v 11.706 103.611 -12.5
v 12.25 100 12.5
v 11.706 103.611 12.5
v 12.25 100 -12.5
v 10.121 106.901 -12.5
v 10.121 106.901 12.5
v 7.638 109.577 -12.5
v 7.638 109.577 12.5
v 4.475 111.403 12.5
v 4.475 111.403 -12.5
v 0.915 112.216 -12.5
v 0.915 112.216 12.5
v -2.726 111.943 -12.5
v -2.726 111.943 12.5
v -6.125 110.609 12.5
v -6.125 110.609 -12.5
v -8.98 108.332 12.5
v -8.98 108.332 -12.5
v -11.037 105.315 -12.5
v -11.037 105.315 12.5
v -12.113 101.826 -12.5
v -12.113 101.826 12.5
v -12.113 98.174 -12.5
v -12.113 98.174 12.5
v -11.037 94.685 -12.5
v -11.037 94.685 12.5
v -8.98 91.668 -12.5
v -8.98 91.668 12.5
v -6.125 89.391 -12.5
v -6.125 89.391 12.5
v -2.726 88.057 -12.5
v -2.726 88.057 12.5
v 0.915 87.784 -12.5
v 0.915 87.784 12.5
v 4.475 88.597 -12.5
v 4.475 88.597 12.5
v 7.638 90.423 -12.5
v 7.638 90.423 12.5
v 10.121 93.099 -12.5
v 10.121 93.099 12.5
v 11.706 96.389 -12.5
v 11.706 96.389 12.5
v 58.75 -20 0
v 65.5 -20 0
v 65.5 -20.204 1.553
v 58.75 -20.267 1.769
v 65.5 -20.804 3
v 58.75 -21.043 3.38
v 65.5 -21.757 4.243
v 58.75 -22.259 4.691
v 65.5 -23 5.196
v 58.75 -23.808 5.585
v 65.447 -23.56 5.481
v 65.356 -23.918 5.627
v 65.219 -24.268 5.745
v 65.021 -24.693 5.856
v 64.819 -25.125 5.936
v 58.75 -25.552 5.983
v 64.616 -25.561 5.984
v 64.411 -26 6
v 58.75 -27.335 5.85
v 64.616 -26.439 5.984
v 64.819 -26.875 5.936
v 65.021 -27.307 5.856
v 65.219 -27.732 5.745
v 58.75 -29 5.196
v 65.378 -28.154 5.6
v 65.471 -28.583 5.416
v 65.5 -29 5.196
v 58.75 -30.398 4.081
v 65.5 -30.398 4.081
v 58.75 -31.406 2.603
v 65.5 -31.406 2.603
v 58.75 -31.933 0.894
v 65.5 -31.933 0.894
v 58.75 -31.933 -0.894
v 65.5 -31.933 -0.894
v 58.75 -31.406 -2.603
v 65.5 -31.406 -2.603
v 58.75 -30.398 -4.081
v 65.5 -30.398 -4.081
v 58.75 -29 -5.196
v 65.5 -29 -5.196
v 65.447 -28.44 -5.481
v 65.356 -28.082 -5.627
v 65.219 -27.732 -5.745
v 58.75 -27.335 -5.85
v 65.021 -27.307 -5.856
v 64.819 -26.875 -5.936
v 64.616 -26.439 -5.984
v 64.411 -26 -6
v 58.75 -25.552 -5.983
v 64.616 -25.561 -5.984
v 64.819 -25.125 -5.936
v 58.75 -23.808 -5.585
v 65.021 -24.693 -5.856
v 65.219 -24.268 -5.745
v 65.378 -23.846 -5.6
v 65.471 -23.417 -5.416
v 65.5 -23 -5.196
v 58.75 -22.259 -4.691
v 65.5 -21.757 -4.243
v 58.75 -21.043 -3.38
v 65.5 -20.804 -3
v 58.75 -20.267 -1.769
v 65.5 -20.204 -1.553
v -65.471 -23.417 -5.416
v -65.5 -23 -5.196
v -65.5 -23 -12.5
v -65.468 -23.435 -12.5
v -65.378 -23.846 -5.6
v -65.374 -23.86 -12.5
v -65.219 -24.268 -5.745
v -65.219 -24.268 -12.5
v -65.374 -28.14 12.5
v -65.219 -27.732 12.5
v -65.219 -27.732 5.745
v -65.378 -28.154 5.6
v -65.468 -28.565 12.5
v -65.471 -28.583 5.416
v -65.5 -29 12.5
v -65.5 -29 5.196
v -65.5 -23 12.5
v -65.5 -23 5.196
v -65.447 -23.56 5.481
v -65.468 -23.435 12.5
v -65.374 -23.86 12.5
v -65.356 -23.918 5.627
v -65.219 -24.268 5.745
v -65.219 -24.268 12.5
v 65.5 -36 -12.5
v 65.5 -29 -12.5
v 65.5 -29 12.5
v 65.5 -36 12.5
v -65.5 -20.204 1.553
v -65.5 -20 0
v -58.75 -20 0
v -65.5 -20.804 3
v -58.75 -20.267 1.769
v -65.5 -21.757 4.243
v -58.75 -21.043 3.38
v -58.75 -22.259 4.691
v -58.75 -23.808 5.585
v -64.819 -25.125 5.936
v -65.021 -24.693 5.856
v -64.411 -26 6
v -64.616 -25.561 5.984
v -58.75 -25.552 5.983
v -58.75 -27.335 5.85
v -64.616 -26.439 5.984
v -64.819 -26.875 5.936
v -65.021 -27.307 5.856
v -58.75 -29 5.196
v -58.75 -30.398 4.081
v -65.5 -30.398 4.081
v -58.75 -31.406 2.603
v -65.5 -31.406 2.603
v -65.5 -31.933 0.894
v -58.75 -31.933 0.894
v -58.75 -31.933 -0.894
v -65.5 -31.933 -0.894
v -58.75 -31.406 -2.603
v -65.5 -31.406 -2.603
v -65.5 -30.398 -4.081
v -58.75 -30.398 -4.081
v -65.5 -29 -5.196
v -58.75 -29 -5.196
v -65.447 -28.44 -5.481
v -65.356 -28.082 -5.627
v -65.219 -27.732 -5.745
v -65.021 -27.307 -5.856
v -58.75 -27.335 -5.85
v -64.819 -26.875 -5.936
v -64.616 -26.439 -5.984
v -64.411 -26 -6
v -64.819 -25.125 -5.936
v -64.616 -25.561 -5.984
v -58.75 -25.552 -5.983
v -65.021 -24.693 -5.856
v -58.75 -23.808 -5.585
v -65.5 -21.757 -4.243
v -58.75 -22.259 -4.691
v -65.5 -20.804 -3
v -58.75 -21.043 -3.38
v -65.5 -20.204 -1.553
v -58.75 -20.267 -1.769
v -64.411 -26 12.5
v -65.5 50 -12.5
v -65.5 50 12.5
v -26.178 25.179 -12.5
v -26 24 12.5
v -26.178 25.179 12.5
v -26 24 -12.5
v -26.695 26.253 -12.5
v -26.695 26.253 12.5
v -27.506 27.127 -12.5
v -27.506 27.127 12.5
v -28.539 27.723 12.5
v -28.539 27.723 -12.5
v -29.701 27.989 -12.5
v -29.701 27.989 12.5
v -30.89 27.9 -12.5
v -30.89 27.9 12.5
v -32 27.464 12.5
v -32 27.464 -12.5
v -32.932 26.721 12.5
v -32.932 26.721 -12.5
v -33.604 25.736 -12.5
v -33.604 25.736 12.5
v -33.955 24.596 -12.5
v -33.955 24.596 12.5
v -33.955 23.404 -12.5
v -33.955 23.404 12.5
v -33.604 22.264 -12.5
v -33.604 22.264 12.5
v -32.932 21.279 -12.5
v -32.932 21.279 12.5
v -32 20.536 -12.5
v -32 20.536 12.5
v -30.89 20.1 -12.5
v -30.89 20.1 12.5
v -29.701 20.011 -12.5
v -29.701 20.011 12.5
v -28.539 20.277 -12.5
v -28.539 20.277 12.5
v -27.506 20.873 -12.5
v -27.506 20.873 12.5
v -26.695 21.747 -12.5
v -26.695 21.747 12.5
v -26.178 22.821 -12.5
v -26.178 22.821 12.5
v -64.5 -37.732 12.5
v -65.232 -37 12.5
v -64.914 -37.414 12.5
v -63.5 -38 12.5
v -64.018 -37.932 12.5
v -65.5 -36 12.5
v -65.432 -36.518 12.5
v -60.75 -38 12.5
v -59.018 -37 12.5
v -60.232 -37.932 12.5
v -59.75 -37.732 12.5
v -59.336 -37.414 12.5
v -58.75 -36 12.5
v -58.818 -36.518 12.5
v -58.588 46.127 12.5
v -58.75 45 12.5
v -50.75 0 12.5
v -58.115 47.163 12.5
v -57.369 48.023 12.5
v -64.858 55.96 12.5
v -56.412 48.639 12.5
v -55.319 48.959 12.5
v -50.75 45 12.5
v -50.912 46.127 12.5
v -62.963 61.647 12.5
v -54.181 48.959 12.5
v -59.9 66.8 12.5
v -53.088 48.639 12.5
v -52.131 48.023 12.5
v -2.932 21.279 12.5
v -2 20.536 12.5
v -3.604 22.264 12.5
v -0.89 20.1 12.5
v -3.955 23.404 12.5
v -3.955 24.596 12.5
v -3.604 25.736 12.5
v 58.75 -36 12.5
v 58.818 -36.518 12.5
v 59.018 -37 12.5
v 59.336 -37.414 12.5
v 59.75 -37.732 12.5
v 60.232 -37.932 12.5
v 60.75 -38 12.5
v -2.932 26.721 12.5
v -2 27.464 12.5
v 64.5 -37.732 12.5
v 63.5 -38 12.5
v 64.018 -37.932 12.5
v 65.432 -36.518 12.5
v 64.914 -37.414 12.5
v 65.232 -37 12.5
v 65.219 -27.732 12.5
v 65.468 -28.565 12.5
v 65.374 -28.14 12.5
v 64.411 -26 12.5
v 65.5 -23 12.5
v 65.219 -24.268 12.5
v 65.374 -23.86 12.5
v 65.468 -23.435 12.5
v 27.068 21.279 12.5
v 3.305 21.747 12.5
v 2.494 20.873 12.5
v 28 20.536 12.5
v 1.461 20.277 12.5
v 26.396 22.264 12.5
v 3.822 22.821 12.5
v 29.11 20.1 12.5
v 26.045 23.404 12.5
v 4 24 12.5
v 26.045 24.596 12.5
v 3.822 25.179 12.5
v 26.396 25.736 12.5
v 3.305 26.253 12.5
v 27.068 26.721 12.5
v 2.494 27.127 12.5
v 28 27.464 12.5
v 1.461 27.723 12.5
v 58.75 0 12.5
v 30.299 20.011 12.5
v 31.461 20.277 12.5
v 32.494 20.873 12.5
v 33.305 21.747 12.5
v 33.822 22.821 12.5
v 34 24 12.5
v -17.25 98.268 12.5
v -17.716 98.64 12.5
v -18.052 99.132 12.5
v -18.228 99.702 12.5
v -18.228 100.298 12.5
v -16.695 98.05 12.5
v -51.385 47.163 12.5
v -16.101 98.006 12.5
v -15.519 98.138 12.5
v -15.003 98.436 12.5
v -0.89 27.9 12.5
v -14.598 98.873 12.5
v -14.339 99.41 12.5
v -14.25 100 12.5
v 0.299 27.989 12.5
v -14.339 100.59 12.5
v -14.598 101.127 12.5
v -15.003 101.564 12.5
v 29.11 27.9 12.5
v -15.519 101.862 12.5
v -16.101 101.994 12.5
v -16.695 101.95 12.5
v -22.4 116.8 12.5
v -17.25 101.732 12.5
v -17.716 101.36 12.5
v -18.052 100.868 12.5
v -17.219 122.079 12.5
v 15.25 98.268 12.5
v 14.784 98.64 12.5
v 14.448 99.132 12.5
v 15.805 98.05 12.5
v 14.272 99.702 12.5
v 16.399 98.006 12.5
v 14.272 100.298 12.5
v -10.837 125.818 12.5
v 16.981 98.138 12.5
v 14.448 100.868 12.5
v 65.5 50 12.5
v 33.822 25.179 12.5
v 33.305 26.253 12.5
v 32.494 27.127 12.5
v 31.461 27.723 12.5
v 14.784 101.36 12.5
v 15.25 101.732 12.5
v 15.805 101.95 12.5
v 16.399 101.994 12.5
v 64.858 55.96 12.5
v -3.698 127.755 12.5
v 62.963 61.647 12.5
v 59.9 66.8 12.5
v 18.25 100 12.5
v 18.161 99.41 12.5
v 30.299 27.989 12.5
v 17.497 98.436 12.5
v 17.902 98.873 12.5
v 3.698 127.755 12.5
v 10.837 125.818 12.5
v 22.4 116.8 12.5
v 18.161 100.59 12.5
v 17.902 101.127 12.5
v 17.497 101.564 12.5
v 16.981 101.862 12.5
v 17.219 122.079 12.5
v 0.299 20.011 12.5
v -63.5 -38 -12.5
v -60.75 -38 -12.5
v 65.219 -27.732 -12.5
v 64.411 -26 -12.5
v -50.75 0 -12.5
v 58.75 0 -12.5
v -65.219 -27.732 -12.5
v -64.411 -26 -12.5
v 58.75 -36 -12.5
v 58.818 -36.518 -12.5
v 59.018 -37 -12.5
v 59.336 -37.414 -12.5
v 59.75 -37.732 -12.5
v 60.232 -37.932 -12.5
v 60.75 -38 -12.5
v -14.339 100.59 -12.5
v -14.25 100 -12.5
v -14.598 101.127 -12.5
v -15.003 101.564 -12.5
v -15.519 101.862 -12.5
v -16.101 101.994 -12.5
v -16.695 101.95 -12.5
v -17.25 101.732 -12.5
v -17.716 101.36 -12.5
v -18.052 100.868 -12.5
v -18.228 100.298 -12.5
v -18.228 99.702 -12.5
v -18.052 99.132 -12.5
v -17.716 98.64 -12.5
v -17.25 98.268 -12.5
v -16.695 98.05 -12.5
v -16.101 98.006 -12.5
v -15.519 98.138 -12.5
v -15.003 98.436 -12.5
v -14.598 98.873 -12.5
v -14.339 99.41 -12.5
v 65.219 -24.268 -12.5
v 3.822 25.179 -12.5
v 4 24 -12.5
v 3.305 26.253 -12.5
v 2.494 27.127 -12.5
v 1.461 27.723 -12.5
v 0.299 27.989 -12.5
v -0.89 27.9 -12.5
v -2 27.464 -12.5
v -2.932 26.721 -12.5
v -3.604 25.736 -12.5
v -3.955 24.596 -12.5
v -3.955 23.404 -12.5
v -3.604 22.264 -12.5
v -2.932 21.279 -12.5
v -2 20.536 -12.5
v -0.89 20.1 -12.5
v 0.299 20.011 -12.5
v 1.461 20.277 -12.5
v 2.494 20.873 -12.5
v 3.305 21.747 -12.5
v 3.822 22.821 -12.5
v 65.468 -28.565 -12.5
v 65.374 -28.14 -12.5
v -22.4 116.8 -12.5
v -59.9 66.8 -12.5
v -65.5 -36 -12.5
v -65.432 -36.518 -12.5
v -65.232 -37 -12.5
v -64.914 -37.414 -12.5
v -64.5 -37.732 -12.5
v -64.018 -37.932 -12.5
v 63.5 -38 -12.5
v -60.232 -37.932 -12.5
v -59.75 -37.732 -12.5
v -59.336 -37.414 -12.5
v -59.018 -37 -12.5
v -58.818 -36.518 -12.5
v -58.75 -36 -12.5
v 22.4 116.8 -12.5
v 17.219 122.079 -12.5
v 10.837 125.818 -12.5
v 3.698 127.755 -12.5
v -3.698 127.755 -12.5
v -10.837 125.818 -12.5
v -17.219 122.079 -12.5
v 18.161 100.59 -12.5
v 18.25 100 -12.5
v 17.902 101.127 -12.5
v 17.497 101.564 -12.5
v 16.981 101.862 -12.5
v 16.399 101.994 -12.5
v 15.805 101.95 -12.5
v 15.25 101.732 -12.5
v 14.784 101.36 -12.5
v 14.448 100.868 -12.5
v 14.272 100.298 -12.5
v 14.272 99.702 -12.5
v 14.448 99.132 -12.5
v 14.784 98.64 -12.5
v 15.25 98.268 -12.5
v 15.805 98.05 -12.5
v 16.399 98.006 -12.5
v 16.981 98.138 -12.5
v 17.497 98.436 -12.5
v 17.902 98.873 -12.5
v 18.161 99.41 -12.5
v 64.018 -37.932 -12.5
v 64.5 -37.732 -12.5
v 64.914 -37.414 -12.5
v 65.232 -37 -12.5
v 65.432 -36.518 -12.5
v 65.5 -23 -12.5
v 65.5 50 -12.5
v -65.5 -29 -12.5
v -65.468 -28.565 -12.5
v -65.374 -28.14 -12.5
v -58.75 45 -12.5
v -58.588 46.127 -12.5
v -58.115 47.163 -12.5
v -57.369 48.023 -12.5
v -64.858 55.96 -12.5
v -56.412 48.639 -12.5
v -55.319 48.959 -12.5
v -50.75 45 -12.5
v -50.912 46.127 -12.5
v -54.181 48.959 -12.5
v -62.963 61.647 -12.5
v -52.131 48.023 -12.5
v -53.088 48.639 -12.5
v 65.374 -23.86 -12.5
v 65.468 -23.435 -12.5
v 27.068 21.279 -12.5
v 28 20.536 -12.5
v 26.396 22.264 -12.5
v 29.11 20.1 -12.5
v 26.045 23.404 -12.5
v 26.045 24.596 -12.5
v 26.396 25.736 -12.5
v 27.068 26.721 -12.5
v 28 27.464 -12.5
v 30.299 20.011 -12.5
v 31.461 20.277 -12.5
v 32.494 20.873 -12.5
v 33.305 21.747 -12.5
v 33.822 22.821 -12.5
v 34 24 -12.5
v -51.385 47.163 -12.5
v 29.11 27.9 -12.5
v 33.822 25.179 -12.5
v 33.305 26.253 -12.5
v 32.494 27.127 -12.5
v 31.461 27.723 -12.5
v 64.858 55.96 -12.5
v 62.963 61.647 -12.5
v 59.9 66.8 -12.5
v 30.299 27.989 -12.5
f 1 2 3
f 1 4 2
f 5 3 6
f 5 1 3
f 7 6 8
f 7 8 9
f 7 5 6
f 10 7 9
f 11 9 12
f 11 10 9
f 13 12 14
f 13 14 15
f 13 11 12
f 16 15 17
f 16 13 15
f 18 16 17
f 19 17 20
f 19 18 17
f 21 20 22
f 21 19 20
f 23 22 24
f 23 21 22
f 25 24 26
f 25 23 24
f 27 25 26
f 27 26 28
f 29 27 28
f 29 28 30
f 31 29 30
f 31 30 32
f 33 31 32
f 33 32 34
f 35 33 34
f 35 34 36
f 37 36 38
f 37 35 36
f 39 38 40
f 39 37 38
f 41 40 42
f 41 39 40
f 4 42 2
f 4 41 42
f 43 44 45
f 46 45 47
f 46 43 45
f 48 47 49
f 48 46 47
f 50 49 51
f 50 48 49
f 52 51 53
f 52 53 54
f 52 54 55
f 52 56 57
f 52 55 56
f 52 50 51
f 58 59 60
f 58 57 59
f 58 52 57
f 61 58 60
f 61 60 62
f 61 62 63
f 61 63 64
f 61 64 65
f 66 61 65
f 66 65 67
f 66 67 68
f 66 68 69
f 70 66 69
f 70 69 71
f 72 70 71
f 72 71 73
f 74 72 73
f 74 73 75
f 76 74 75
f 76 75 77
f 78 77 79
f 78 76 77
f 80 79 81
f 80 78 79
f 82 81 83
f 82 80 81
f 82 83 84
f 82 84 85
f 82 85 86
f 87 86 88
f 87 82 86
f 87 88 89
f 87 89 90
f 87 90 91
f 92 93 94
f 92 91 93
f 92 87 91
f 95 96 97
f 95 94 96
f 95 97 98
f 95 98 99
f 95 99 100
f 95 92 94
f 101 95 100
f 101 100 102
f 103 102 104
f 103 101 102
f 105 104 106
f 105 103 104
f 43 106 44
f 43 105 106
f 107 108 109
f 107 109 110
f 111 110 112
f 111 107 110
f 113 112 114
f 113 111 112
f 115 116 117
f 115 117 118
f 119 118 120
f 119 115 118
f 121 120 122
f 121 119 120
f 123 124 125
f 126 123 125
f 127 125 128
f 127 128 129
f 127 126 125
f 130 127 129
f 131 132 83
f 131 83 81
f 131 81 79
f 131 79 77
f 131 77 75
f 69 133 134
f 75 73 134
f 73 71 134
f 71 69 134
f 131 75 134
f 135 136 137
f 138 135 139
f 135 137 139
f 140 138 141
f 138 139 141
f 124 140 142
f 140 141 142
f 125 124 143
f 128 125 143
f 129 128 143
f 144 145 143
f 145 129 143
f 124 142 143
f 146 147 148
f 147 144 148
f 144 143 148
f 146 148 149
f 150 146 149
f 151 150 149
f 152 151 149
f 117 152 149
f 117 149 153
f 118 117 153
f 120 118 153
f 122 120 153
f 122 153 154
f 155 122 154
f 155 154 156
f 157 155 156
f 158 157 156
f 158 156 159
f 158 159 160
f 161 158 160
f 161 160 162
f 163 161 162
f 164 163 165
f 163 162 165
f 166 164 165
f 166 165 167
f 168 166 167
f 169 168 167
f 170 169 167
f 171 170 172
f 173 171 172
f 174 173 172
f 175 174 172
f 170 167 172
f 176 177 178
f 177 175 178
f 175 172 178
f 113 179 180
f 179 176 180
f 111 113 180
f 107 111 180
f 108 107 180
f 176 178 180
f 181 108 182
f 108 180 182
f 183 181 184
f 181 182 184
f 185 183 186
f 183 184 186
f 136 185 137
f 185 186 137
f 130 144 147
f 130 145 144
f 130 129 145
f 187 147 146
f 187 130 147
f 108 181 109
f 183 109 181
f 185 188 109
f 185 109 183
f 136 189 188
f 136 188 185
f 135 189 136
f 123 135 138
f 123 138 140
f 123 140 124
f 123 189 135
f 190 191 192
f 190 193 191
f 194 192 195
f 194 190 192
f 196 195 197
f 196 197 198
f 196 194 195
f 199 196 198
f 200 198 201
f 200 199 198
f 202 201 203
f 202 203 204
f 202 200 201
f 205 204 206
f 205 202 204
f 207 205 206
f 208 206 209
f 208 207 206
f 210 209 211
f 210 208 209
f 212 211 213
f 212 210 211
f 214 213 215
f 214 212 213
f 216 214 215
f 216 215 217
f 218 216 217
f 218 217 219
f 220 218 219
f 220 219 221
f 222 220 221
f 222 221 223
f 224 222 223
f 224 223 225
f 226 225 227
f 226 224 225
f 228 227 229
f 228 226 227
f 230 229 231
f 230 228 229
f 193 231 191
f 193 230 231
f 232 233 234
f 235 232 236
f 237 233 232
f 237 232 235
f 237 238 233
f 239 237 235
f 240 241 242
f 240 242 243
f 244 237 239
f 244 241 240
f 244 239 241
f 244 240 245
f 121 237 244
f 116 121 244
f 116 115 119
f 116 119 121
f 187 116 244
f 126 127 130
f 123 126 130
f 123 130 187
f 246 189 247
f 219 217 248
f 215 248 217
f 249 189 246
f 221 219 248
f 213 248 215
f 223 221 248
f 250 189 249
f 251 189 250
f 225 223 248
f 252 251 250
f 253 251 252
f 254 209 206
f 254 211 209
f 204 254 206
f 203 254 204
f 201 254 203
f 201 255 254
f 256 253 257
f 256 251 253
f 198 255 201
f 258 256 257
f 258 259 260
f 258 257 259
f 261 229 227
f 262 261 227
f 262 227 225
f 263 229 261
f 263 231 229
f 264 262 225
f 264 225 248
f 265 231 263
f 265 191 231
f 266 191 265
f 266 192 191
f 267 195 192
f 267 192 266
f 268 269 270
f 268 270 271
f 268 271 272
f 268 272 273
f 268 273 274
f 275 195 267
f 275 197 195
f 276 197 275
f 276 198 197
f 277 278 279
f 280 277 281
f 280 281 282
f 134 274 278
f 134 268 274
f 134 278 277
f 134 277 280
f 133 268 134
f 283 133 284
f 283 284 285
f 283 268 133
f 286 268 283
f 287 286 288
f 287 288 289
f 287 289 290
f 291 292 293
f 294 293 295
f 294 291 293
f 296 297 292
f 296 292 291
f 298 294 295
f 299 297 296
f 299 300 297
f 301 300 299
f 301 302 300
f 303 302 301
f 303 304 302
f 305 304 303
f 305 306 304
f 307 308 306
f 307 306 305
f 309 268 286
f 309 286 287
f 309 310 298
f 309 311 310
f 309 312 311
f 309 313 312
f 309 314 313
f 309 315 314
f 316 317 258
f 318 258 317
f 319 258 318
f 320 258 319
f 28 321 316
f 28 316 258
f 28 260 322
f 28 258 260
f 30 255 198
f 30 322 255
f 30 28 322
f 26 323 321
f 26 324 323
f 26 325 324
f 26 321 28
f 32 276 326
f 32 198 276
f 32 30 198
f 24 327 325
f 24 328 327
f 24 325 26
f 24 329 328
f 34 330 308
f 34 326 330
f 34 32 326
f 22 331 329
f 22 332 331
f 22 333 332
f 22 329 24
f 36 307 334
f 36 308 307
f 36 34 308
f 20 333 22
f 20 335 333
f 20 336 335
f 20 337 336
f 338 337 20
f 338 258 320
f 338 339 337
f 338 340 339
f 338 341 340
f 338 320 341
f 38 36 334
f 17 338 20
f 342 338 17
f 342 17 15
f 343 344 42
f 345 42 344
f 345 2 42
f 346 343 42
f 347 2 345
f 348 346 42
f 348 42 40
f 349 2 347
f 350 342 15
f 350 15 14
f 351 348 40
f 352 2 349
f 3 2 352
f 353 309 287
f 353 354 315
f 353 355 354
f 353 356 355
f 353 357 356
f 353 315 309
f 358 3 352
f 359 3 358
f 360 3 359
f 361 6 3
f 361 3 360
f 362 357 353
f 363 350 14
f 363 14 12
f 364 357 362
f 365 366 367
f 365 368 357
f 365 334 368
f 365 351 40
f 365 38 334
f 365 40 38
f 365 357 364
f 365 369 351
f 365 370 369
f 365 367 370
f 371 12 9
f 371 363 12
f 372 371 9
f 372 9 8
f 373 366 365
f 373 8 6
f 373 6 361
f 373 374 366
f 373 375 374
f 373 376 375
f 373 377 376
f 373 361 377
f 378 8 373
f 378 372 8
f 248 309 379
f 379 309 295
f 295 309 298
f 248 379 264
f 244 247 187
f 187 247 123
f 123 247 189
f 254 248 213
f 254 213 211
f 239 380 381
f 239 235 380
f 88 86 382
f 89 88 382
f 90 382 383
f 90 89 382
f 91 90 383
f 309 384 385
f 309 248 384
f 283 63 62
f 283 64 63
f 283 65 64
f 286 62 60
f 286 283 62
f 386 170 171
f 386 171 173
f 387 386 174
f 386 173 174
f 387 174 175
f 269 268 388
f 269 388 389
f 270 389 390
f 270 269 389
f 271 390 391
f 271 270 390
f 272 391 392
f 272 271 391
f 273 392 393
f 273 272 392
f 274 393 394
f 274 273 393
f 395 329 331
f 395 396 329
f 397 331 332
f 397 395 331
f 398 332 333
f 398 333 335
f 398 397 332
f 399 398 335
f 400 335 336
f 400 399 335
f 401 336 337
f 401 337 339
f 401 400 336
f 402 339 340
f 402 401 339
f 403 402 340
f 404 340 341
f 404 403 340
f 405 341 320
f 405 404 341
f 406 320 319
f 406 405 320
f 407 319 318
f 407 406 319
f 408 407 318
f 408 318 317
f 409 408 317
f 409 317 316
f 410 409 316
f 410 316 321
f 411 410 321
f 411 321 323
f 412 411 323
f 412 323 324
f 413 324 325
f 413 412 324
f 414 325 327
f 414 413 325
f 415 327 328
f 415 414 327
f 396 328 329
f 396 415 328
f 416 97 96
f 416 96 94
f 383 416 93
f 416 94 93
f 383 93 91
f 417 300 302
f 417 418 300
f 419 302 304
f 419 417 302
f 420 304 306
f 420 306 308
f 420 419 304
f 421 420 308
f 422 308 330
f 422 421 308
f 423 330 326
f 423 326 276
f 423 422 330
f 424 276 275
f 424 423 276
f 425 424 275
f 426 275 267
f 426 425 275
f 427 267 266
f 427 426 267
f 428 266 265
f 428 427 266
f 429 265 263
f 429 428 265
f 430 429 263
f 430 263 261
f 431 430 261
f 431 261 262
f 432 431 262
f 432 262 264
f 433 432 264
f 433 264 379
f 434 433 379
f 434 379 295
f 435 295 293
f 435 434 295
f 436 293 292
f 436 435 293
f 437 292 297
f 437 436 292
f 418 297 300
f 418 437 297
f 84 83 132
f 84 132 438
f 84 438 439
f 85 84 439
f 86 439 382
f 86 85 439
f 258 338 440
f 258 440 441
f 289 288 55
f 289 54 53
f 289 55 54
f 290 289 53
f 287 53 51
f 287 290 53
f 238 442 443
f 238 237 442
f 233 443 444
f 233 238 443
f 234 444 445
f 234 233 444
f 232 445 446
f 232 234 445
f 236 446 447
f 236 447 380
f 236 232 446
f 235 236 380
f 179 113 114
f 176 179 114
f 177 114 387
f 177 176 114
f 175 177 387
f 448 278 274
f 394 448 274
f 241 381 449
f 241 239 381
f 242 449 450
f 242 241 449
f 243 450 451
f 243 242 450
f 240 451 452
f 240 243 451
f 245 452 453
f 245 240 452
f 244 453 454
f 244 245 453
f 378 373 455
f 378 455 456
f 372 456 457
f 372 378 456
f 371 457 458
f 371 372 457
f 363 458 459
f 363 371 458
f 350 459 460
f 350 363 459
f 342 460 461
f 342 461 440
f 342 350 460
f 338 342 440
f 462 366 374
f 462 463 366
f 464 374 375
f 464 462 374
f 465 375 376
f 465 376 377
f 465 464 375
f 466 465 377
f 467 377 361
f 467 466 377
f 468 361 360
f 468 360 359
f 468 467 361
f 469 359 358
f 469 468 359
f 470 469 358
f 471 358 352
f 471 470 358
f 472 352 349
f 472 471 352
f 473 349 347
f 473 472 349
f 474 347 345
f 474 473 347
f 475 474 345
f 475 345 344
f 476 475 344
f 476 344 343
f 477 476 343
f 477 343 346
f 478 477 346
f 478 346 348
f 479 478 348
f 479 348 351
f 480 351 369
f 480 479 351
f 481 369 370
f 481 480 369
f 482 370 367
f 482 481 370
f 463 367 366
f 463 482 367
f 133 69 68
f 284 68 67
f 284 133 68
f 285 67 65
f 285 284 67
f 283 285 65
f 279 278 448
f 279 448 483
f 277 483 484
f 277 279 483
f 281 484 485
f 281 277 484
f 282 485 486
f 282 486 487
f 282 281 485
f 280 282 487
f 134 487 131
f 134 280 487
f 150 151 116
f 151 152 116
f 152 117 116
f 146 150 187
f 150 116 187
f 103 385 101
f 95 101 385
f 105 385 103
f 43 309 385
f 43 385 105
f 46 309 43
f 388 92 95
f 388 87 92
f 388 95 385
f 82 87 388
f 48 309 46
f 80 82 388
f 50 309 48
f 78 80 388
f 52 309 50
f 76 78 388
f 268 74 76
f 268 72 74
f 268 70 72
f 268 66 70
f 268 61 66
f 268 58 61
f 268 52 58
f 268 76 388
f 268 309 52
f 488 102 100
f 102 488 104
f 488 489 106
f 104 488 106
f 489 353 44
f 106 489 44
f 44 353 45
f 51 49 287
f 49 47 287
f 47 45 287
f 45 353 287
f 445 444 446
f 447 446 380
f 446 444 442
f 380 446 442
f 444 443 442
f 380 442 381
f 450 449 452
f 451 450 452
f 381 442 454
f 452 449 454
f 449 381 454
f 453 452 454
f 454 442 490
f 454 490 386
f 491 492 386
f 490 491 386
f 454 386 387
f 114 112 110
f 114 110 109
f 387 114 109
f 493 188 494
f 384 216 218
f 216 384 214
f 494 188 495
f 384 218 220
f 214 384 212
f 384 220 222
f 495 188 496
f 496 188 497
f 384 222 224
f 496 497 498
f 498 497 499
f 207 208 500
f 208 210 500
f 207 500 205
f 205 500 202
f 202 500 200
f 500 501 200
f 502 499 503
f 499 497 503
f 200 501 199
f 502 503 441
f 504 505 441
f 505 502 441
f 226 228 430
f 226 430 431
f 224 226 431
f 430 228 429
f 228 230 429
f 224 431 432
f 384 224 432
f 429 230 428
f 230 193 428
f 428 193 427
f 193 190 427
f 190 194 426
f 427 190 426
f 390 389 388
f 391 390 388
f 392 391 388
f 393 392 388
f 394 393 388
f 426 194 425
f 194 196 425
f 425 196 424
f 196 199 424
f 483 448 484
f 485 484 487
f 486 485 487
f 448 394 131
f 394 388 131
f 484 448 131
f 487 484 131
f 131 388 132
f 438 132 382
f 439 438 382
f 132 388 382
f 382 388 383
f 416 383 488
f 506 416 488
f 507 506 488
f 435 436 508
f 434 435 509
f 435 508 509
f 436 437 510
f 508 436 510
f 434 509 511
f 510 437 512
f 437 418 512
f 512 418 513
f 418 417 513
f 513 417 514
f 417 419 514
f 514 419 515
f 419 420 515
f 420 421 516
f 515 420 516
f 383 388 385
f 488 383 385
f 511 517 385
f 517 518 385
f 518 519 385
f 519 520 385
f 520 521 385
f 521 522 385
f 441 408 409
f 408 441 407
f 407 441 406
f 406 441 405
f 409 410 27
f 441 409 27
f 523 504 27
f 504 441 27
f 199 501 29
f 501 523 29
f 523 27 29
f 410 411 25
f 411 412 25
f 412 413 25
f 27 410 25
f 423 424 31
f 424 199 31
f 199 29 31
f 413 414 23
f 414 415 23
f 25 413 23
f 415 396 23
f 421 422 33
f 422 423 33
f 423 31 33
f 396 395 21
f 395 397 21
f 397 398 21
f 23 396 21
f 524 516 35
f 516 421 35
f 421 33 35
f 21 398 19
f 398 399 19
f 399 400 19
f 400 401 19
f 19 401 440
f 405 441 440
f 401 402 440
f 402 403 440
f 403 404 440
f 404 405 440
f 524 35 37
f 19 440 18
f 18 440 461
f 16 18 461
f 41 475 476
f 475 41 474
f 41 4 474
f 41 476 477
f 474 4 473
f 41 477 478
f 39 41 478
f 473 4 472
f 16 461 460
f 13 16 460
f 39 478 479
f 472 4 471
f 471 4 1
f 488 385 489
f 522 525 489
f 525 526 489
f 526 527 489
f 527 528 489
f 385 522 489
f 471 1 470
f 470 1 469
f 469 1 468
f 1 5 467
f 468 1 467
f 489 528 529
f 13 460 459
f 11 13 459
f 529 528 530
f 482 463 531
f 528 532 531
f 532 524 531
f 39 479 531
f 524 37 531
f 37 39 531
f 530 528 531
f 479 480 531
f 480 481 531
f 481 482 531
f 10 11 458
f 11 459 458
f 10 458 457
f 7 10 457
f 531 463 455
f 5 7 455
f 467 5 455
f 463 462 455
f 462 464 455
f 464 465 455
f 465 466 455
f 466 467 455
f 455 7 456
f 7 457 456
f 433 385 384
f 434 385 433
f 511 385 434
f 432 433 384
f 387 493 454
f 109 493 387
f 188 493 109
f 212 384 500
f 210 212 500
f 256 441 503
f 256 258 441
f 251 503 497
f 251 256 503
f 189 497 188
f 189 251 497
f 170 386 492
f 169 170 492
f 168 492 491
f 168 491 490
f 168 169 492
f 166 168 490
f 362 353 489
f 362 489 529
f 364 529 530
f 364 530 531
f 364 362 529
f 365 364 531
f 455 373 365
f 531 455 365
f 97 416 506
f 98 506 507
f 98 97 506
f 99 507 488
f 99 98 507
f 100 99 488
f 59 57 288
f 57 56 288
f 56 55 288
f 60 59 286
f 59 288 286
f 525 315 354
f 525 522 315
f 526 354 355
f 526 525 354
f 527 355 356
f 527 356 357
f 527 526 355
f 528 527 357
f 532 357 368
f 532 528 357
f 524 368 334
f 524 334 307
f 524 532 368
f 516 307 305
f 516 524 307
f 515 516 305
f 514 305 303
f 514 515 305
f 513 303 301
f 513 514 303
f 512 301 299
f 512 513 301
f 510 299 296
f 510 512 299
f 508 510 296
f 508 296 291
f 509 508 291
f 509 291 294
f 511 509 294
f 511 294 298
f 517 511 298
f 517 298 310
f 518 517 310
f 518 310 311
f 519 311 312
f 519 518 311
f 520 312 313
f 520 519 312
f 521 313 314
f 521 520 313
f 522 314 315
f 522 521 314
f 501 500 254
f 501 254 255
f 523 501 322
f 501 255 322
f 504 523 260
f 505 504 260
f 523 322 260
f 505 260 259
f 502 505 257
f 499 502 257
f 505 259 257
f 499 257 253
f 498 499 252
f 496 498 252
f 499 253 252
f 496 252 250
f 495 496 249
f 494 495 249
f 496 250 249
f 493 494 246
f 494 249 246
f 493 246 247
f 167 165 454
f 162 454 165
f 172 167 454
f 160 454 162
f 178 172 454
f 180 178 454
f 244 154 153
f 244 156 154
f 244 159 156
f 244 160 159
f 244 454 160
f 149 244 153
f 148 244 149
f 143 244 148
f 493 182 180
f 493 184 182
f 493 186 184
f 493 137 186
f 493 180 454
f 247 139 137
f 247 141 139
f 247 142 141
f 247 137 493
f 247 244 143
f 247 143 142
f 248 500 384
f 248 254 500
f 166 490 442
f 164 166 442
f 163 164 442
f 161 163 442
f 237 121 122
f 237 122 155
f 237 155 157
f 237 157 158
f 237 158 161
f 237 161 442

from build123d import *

# Parameters (mm, degrees)
SKETCH_R          = 12.25
SKETCH_R_2        = 2
SKETCH_R_3        = 4
PAD_DEPTH         = 12.5
SKETCH001_R       = 6
POCKET_DEPTH      = 65.501
POCKET_DEPTH_BACK = -65.501


with BuildPart() as part:
    # Sketch → Pad (new body, symmetric)
    with BuildSketch(Plane.XY):
        with BuildLine():
            Line((-50.75, 0), (58.75, 0))
            Line((58.75, 0), (58.75, -36))
            ThreePointArc((58.75, -36), (59.335786, -37.414214), (60.75, -38))
            Line((63.5, -38), (60.75, -38))
            ThreePointArc((63.5, -38), (64.914214, -37.414214), (65.5, -36))
            Line((65.5, -29), (65.5, -36))
            ThreePointArc((65.5, -29), (65.428888, -28.350681), (65.218923, -27.732145))
            Line((65.218923, -27.732145), (64.411211, -26))
            Line((65.218923, -24.267855), (64.411211, -26))
            ThreePointArc((65.218923, -24.267855), (65.428888, -23.649319), (65.5, -23))
            Line((65.5, 0), (65.5, -23))
            Line((65.5, 50), (65.5, 0))
            ThreePointArc((65.5, 50), (64.063132, 58.854377), (59.9, 66.8))
            Line((22.4, 116.8), (59.9, 66.8))
            ThreePointArc((22.4, 116.8), (0, 128), (-22.4, 116.8))
            Line((-22.4, 116.8), (-59.9, 66.8))
            ThreePointArc((-59.9, 66.8), (-64.063132, 58.854377), (-65.5, 50))
            Line((-65.5, 0), (-65.5, 50))
            Line((-65.5, 0), (-65.5, -23))
            ThreePointArc((-65.5, -23), (-65.428888, -23.649319), (-65.218923, -24.267855))
            Line((-65.218923, -24.267855), (-64.411211, -26))
            Line((-65.218923, -27.732145), (-64.411211, -26))
            ThreePointArc((-65.218923, -27.732145), (-65.428888, -28.350681), (-65.5, -29))
            Line((-65.5, -29), (-65.5, -36))
            ThreePointArc((-65.5, -36), (-64.914214, -37.414214), (-63.5, -38))
            Line((-63.5, -38), (-60.75, -38))
            ThreePointArc((-60.75, -38), (-59.335786, -37.414214), (-58.75, -36))
            Line((-58.75, 0), (-58.75, -36))
            Line((-58.75, 0), (-58.75, 45))
            ThreePointArc((-50.75, 45), (-54.75, 49), (-58.75, 45))
            Line((-50.75, 45), (-50.75, 0))
        make_face()
        with Locations((0, 100)):
            Circle(SKETCH_R, mode=Mode.SUBTRACT)
        with Locations((16.25, 100)):
            Circle(SKETCH_R_2, mode=Mode.SUBTRACT)
        with Locations((-16.25, 100)):
            Circle(SKETCH_R_2, mode=Mode.SUBTRACT)
        with Locations((0, 24)):
            Circle(SKETCH_R_3, mode=Mode.SUBTRACT)
        with Locations((30, 24)):
            Circle(SKETCH_R_3, mode=Mode.SUBTRACT)
        with Locations((-30, 24)):
            Circle(SKETCH_R_3, mode=Mode.SUBTRACT)
    extrude(amount=PAD_DEPTH, both=True)

    # Sketch001 → Pocket (cut, two sides)
    with BuildSketch(Plane.YZ) as pocket_sk:
        with Locations((-26, 0)):
            Circle(SKETCH001_R)
    extrude(amount=-POCKET_DEPTH, mode=Mode.SUBTRACT)
    extrude(pocket_sk.sketch, amount=-POCKET_DEPTH_BACK, mode=Mode.SUBTRACT)


solid = part.part
